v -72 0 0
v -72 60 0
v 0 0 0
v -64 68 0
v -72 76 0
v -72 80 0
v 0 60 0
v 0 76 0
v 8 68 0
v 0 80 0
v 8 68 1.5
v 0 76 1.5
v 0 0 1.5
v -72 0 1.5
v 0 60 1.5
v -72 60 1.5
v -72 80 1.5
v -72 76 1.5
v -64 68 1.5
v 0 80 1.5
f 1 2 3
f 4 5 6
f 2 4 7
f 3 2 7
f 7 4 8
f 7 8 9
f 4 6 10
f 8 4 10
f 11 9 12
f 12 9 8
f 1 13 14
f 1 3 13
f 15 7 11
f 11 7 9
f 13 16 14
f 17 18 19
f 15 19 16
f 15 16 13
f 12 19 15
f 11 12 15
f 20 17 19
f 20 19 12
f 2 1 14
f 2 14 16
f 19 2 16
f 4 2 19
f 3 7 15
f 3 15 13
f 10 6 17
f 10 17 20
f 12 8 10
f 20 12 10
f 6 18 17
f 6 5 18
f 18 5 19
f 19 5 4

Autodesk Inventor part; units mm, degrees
ref_plane "YZ Plane" through (0, 0, 0) normal (1, 0, 0) x (0, 1, 0)
ref_plane "XZ Plane" through (0, 0, 0) normal (0, 1, 0) x (-1, 0, 0)
ref_plane "XY Plane" through (0, 0, 0) normal (0, 0, 1) x (1, 0, 0)
sketch "Sketch1" plane through (0, 0, 0) normal (0, 0, 1) x (1, 0, 0)
  line L0 (0, 0) -> (-72, 0)
  circle A0 centre (-72, 68) radius 8 construction
  line L1 (-72, 60) -> (0, 60) construction
  line L2 (-72, 76) -> (-64, 68)
  line L3 (-72, 60) -> (-64, 68)
  line L4 (0, 60) -> (0, 0)
  line L5 (-72, 0) -> (-72, 60)
  line L6 (-72, 76) -> (-72, 80)
  line L7 (0, 76) -> (0, 80)
  line L8 (-72, 80) -> (0, 80)
  line L9 (-72, 76) -> (11.0791, 76) construction
  line L10 (-64, 68) -> (11.3495, 68) construction
  line L11 (-72, 60) -> (22.6598, 60) construction
  circle A1 centre (0, 68) radius 8 construction
  line L12 (0, 60) -> (8, 68)
  line L13 (8, 68) -> (0, 76)
  point P0 (0, 0)
  point P1 (0, 78)
  point P2 (-72, 78)
  dimension "d0" = 80
  dimension "d2" = 60
  dimension "d3" = 0
  dimension "d4" = 0
  dimension "d5" = 72
extrude "Extrusion1" add sketch "Sketch1" along normal blind 1.5
properties part number "MS_RI_back_v3"
